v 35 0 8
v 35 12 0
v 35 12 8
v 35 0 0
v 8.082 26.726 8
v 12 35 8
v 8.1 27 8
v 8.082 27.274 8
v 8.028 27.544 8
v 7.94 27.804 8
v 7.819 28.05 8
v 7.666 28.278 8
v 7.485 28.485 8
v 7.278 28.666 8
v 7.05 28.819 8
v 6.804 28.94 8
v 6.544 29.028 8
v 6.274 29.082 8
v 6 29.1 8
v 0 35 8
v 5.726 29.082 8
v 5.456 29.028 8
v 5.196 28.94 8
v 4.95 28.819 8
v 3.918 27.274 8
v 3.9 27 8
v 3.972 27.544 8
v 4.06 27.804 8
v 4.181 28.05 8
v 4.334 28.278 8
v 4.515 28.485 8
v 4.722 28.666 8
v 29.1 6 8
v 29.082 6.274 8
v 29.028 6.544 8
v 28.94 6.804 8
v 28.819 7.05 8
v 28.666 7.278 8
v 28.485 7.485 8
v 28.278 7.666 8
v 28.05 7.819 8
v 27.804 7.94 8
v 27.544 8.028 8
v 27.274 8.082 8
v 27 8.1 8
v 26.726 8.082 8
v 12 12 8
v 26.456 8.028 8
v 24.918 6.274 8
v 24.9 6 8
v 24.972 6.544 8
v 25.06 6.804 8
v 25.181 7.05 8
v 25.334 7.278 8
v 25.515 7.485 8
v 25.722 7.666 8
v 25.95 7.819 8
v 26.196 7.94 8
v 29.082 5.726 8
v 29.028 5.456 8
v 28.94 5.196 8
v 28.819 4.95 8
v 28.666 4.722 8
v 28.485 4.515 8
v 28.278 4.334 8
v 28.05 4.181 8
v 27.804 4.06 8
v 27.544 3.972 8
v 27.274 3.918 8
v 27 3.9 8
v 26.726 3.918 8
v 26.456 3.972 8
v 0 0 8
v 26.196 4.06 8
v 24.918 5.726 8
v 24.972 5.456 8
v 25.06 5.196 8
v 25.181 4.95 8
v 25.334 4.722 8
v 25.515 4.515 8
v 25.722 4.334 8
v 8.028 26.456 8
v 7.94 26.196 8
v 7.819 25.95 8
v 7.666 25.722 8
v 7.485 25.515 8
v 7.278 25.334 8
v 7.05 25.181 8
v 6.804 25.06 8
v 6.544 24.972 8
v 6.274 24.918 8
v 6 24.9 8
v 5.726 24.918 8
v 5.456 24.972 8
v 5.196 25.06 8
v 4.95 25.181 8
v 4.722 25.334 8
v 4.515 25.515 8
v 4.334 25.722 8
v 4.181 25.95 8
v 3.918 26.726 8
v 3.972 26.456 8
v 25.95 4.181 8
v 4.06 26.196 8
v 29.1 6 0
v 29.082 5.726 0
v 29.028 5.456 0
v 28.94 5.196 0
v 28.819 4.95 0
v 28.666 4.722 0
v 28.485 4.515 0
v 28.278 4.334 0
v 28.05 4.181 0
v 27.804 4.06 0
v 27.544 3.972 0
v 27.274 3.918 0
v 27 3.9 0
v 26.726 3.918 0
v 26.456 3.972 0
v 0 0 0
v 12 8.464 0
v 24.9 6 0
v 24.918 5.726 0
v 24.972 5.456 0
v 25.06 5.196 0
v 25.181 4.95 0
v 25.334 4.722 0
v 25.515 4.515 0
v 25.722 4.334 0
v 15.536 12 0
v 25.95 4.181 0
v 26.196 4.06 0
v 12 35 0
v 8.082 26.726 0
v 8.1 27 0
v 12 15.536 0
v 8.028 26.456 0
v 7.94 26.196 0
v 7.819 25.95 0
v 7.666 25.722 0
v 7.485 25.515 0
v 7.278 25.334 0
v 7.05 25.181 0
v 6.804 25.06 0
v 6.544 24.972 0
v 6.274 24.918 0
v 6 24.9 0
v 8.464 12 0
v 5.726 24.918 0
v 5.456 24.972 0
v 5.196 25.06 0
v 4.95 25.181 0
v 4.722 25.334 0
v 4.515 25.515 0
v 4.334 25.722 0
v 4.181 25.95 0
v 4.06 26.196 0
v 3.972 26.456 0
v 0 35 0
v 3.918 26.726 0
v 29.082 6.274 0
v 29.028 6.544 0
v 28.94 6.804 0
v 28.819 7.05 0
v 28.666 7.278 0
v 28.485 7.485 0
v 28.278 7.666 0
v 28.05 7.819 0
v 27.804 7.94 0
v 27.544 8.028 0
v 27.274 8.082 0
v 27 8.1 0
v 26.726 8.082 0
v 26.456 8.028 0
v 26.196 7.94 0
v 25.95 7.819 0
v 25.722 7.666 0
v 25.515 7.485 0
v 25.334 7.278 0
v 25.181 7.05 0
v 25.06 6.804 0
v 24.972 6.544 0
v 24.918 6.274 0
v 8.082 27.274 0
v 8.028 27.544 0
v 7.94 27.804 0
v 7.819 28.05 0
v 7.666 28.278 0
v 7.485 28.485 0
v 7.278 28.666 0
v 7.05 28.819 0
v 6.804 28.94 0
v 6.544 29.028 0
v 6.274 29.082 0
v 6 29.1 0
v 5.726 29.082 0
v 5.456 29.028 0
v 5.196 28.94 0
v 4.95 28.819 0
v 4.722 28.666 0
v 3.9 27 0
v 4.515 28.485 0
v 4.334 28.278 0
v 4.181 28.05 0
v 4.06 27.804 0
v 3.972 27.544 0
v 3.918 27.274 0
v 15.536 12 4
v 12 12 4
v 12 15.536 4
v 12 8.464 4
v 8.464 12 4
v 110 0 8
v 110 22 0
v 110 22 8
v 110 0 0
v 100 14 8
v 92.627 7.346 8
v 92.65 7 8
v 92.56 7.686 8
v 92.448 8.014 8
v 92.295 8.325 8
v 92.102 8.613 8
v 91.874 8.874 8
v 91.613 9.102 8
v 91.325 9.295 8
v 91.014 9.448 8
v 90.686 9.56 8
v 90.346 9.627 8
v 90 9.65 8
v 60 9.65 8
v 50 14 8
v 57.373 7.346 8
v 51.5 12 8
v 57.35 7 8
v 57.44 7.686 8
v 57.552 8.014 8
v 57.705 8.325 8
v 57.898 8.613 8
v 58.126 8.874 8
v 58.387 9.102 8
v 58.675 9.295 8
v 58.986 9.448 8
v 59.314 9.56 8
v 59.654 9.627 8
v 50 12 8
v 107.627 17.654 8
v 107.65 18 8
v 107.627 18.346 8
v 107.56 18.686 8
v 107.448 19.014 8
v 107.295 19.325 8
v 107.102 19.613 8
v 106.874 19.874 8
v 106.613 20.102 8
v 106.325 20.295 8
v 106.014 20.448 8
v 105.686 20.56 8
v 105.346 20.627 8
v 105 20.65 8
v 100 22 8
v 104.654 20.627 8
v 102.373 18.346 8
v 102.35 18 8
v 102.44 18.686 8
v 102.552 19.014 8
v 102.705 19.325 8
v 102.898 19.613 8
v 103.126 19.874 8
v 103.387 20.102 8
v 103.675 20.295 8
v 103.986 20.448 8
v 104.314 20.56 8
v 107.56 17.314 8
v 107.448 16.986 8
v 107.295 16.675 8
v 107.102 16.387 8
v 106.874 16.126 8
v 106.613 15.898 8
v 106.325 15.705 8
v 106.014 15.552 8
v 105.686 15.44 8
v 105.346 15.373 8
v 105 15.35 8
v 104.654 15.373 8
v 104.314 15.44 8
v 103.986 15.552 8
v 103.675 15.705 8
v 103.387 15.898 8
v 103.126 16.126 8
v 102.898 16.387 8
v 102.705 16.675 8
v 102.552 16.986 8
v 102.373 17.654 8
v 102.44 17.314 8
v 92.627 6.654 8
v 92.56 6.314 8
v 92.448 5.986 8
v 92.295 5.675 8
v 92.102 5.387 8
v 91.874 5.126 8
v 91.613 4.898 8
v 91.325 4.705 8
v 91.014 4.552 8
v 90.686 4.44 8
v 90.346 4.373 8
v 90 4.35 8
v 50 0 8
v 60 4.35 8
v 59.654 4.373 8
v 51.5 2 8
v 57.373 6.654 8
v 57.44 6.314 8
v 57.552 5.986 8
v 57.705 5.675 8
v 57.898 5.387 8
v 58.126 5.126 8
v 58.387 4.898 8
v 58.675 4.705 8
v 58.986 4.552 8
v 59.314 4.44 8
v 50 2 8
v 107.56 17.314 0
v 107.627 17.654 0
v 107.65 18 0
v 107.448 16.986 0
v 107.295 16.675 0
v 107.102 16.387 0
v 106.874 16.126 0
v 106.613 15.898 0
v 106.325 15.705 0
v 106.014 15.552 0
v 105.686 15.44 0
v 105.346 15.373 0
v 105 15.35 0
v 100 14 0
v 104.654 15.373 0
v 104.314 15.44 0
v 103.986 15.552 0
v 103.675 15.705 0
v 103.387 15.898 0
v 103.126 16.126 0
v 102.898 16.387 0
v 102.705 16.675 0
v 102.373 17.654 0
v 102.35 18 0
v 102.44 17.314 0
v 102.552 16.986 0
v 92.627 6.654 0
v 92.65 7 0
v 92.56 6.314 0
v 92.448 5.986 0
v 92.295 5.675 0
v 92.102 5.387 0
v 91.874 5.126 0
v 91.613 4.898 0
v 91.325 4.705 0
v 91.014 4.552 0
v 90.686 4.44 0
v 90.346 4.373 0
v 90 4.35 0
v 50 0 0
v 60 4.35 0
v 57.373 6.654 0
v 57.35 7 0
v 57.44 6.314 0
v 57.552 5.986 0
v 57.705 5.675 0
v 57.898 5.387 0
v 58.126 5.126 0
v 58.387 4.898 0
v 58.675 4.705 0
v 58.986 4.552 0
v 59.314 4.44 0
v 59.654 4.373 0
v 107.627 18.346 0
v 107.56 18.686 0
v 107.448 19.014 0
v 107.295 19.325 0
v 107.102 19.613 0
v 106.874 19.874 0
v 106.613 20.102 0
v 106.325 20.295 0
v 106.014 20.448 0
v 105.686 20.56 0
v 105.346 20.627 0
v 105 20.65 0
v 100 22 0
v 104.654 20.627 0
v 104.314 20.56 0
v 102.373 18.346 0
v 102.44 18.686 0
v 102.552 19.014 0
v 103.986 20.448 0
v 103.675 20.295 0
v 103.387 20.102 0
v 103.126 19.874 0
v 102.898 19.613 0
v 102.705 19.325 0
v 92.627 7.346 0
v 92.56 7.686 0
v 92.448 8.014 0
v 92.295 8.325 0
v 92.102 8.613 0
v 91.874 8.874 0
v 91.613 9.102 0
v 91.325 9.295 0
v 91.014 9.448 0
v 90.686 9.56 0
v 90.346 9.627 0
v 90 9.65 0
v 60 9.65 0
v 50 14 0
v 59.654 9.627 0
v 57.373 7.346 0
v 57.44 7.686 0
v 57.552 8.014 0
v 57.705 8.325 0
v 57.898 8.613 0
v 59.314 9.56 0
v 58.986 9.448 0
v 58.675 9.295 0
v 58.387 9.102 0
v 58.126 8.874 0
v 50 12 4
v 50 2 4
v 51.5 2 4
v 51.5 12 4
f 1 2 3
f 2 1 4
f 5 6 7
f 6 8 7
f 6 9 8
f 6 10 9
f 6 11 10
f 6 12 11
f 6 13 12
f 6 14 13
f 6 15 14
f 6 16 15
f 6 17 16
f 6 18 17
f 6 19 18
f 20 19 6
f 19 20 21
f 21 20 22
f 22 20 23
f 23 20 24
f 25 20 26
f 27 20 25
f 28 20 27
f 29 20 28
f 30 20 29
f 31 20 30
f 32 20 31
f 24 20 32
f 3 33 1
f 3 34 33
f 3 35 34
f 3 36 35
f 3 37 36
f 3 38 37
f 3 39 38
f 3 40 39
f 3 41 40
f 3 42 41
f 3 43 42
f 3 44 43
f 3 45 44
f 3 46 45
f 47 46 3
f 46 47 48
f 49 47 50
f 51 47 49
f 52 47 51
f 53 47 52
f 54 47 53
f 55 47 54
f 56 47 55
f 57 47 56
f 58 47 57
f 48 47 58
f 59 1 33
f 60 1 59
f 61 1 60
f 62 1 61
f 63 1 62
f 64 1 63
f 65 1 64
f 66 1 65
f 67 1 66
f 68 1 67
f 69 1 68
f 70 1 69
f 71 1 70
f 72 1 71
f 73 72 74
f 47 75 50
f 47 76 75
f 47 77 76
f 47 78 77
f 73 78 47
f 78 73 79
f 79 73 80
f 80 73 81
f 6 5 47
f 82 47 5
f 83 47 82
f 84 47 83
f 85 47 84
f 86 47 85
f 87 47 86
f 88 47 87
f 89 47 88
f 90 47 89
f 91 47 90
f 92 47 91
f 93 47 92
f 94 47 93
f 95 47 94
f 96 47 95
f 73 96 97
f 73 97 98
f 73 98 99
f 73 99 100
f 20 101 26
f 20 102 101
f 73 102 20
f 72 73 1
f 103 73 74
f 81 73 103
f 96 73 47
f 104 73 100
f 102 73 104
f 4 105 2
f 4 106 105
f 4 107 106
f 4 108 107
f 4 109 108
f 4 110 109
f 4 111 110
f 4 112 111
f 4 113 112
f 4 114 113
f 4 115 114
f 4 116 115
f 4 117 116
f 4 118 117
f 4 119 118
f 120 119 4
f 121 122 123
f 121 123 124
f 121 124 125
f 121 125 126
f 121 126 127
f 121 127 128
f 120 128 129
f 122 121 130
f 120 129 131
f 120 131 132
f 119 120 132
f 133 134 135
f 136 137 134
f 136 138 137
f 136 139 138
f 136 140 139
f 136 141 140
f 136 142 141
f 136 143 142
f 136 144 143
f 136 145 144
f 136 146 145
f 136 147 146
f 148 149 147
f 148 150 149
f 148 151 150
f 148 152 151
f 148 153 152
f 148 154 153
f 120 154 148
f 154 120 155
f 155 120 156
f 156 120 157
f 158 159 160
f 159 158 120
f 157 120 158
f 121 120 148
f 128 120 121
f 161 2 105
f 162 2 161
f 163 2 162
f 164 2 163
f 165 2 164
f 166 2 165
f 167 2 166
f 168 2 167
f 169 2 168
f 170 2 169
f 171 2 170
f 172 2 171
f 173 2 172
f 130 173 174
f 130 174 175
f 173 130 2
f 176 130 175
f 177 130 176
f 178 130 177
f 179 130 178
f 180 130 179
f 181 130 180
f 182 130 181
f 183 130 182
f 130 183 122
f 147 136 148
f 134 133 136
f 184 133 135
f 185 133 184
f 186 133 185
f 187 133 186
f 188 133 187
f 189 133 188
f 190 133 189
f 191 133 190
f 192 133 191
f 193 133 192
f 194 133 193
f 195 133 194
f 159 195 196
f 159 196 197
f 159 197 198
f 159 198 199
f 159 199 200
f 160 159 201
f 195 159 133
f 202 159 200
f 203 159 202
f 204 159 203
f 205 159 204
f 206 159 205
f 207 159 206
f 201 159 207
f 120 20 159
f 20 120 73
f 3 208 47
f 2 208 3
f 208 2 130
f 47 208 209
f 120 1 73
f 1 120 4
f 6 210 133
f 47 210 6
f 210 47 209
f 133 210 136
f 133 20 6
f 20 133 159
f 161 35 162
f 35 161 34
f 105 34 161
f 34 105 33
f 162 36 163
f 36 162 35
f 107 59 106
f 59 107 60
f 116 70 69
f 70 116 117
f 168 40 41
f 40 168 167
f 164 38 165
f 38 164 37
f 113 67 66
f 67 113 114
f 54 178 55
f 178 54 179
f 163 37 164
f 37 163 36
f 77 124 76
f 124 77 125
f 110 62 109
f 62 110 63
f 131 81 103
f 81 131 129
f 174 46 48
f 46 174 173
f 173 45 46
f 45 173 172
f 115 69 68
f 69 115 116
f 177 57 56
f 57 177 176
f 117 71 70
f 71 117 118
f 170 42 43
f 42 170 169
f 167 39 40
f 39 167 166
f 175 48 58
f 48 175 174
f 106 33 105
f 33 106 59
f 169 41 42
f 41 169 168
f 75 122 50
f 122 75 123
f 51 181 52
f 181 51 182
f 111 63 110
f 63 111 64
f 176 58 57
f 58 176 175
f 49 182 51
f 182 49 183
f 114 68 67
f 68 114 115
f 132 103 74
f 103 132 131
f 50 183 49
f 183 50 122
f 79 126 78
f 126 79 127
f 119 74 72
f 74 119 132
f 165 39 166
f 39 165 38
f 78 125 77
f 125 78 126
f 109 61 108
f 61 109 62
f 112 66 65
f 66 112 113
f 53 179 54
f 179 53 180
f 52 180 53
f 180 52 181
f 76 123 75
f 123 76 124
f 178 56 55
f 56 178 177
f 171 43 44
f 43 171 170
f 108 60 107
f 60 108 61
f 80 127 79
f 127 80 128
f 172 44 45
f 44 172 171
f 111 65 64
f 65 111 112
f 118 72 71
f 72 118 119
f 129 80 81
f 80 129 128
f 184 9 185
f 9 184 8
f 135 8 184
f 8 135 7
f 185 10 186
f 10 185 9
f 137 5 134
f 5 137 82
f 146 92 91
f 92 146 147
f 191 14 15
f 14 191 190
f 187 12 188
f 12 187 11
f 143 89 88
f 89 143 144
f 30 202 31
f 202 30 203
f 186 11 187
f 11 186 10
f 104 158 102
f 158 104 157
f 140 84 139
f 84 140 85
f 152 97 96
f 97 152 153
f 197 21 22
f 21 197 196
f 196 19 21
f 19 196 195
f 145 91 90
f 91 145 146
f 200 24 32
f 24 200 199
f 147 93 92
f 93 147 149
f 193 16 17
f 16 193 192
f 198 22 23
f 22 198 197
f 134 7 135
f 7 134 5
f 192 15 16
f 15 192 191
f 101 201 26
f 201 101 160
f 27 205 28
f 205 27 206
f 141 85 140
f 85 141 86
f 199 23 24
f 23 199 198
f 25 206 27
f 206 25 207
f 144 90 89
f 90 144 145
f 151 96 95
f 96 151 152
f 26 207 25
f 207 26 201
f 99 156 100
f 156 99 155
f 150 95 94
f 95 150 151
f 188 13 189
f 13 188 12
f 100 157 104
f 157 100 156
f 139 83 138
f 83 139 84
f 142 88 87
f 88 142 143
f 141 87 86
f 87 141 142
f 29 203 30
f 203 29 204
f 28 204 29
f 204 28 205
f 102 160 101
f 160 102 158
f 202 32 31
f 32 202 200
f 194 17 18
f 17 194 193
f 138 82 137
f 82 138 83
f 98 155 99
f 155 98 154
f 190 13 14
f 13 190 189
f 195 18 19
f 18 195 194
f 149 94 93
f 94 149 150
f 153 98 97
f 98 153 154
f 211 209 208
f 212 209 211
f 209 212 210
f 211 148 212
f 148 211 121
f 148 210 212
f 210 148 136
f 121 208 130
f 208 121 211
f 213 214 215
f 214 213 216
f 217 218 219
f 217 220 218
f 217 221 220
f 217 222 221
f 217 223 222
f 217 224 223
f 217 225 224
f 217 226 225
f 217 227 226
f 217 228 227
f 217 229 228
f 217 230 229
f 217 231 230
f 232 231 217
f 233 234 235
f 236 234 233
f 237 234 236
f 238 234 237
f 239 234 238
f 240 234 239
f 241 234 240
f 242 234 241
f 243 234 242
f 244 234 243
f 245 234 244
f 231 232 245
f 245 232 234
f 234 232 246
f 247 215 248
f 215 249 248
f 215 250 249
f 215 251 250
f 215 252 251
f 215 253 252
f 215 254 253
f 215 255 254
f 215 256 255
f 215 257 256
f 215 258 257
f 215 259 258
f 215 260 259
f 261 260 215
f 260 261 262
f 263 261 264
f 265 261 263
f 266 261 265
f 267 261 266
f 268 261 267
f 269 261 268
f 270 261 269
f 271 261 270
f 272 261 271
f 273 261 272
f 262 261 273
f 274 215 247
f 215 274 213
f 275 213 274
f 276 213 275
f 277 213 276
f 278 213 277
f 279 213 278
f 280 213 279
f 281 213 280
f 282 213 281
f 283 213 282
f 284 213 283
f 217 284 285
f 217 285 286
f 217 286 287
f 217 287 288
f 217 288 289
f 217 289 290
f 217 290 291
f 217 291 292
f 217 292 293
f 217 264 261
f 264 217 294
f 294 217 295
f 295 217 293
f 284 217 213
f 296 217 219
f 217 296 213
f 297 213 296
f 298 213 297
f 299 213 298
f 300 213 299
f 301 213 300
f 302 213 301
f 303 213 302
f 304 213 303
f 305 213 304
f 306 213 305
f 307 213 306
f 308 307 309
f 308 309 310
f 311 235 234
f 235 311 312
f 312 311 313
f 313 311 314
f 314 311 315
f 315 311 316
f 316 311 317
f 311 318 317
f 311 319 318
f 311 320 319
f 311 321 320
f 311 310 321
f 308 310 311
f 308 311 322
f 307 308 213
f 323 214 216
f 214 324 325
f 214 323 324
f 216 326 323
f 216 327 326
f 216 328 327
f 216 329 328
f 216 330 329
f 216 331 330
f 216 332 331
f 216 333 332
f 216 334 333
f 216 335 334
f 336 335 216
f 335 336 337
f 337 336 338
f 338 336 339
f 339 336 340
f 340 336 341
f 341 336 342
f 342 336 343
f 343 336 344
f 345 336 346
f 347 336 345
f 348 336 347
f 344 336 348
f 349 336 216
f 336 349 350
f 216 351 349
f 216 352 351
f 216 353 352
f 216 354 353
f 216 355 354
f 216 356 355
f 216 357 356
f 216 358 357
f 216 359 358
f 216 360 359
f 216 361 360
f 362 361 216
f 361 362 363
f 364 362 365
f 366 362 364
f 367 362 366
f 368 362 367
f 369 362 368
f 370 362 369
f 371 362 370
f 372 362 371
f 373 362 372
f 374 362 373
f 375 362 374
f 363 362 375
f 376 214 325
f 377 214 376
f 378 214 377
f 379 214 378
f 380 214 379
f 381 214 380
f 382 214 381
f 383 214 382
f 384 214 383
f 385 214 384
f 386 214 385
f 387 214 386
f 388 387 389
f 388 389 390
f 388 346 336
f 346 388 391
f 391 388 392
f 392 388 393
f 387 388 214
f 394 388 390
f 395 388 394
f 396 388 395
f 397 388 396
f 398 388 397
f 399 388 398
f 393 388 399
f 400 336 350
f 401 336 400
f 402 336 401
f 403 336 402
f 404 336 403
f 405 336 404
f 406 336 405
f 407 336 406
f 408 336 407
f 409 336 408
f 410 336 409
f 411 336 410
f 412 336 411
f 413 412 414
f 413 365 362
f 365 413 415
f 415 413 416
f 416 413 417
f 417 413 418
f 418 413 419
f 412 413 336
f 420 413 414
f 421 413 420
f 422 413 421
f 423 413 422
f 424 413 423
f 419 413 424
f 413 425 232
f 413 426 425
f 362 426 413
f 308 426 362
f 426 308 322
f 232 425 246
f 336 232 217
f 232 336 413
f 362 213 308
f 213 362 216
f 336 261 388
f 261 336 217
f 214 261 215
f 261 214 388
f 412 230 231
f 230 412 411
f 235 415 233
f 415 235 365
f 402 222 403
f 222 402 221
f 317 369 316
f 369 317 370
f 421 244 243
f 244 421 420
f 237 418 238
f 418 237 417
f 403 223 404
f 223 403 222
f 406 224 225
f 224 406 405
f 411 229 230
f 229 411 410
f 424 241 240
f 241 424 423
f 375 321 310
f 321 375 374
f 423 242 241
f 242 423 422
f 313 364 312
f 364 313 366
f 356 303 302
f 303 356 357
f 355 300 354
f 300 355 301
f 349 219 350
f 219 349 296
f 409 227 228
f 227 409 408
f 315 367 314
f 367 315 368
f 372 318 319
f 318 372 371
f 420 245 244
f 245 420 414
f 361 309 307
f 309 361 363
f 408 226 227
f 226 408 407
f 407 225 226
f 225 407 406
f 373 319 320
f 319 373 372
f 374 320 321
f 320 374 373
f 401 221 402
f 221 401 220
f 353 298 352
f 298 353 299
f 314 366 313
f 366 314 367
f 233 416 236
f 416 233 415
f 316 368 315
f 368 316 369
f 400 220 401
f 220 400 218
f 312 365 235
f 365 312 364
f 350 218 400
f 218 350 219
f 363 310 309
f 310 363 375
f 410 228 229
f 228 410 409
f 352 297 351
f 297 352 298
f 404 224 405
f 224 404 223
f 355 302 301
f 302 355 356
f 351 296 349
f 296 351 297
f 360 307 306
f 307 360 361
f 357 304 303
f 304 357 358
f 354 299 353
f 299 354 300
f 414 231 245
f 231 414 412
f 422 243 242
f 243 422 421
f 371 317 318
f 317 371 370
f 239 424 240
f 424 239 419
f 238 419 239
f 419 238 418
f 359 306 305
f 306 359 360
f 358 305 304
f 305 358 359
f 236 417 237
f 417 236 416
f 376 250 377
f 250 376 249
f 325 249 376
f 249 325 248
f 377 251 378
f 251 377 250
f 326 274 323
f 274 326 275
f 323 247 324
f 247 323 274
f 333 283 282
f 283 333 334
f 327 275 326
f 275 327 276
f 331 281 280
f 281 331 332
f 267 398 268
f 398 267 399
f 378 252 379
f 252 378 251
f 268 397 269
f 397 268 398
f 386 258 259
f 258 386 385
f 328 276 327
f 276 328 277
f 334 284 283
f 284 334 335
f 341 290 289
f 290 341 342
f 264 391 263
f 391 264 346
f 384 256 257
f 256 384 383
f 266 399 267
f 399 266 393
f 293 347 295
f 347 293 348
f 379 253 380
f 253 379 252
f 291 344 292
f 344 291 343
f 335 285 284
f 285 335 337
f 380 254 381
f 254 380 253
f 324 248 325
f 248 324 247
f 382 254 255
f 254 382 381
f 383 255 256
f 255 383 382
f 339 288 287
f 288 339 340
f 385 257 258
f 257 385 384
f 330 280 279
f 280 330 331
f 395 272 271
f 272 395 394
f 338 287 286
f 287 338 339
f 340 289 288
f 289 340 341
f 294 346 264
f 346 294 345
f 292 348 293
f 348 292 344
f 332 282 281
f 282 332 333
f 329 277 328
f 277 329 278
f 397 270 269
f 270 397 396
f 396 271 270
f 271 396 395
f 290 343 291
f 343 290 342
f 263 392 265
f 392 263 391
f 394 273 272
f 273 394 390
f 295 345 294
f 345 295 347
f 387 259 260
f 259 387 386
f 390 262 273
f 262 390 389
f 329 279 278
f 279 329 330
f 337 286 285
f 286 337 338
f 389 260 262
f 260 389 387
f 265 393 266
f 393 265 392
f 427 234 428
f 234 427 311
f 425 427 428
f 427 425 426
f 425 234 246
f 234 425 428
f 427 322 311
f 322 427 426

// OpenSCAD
// file: 00_config.scad
// 00_config.scad — shared dimensions for the AndroidTester machine, in mm.
//
// These constants are the single source for every part in cad/openscad/.
// They are cross-checked by tests/test_design_package.py against
// androidtester/config.py (deck size, clearance planes) and
// firmware/klipper/androidtester.cfg (position_max) — change them together.

// -- deck and travels -------------------------------------------------------
// Deck == reachable XY (cfg position_max == config.py deck defaults).
DECK_W   = 400;          // deck X, config.py deck_width_mm, stepper_x position_max
DECK_D   = 300;          // deck Y, config.py deck_height_mm, stepper_y position_max
X_TRAVEL = 400;          // == DECK_W
Y_TRAVEL = 300;          // == DECK_D
Z_TRAVEL = 60;           // tool-Z elevator travel (manual_stepper tool_z)
TRAVEL_Z = 40;           // clearance plane, config.py travel_z_mm
TOUCH_Z  = 5;            // finger-tip contact plane, config.py touch_z_mm

// -- linear rails -------------------------------------------------------------
// X rail: must span the full X travel plus the carriage plus end margins:
//   X_TRAVEL (400) + X_CARRIAGE_LEN (45) + 2*END_MARGIN (10) = 465 mm min
//   -> RAIL_X_LEN = 500 (next stock MGN12 length, 35 mm of setup slack).
// Y rails (x2, carry the gantry beam):
//   Y_TRAVEL (300) + X_CARRIAGE_LEN (45) + 2*END_MARGIN (10) = 365 mm min
//   -> RAIL_Y_LEN = 400.
// Z rail (tool elevator, MGN9):
//   Z_TRAVEL (60) + Z_CARRIAGE_LEN (40) + 2*END_MARGIN (10) = 120 mm min
//   -> RAIL_Z_LEN = 150.
RAIL_X_LEN = 500;
RAIL_Y_LEN = 400;
RAIL_Z_LEN = 150;
X_CARRIAGE_LEN = 45;     // MGN12H block, 27 x 45.4 mm (nominal — verify rail vendor)
Z_CARRIAGE_LEN = 40;     // MGN9H block, 20 x 38.9 mm (nominal — verify rail vendor)
END_MARGIN   = 10;       // endstop trigger + belt/idler clearance at each rail end
RAIL12_W = 12;           // MGN12 rail width / height
RAIL12_H = 8;
RAIL9_W  = 9;            // MGN9 rail width / height
RAIL9_H  = 6.5;

// -- frame --------------------------------------------------------------------
EXT = 20;                // 2020 aluminium extrusion (6 mm slot)
FRAME_W = DECK_W + 100;  // 500 — gantry beam carries the full X rail (500)
FRAME_D = DECK_D + 100;  // 400 — side beams carry the full Y rails (400)
POST_H  = 200;           // gantry posts above the base frame
CAM_POST_H = 400;        // overhead camera post above the deck

// -- motors / motion hardware ---------------------------------------------------
NEMA_W   = 42.3;         // NEMA17 face
NEMA_HOLE_SP = 31;       // NEMA17 M3 hole spacing
NEMA_BORE  = 22.2;       // NEMA17 pilot bore (clearance)
PULLEY_D = 12.2;         // GT2 20T pulley OD (2 mm pitch x 20 T = 40 mm/rev)
IDLER_D  = 12.2;         // GT2 20T idler OD, 5 mm bore
BELT_W   = 6;            // GT2 belt width
LEAD_D   = 8;            // T8 lead screw (2 mm pitch x 4 starts = 8 mm/rev)

// -- servos (SG90 / MG90S class) -------------------------------------------------
SERVO_W   = 23;          // body across tabs axis
SERVO_D   = 12.5;        // body depth
SERVO_H   = 23;          // body height below the mounting tabs
SERVO_TAB_W = 32.5;      // across the mounting tabs
SERVO_SHAFT_D = 5;       // output shaft / horn boss clearance
SERVO_SHAFT_OFF = 6;     // shaft centre from body end wall

// -- finger tool -----------------------------------------------------------------
FINGER_TIP_D  = 8;       // conductive tip diameter
FINGER_SHAFT_D = 6;      // plunger shaft
SPRING_D  = 8.5;         // compression-spring pocket (Ø8 spring, k ≈ 0.5 N/mm)
FINGER_STROKE = 15;      // spring working stroke (3–12 mm compression -> 1.5–6 N)

// -- fasteners ---------------------------------------------------------------------
M3_CLEAR = 3.2;
M4_CLEAR = 4.2;
M5_CLEAR = 5.3;
M3_HEAD  = 6.0;          // M3 button-head clearance

// -- device nest ---------------------------------------------------------------------
DEVICE_MAX_W = 280;      // phones through ~11" tablets (250 x 170 + case)
DEVICE_MAX_D = 200;
NEST_STOP_H  = 8;        // stop height: below screen, clear of ArUco markers
NEST_CLEAR   = 40;       // keep-out at each deck corner (ArUco marker zone)

$fn = 48;
// main file
// device_nest.scad — adjustable fixture holding the device under test.
// Phones through ~11" tablets (up to DEVICE_MAX_W x DEVICE_MAX_D). Two fixed
// corner stops reference the device; two sliding clamps close against the
// other edges. Everything is NEST_STOP_H (8 mm) tall or shorter — below the
// screen, out of the overhead camera's view of the glass, and clear of the
// NEST_CLEAR (40 mm) ArUco marker zones at the deck corners.
//
// Parts (PART selector):
//   corner_stop — fixed L reference stop, M4 bolts to the deck plate
//   side_clamp  — sliding clamp: 30 mm slot + M5 thumb-screw tab
//
// Export: openscad -o corner_stop.stl -D 'PART="corner_stop"' device_nest.scad
include <00_config.scad>

PART = is_undef(_AT_PART) ? "preview" : _AT_PART;  // -D 'PART=...' or a render wrapper overrides

module corner_stop() {
    arm = 35;
    t = NEST_STOP_H;
    w = 12;              // arm width
    difference() {
        union() {
            cube([arm, w, t]);
            cube([w, arm, t]);
        }
        // M4 bolt holes at the arm ends (deck plate M4 grid)
        translate([arm - 8, w / 2, -0.1]) cylinder(d = M4_CLEAR, h = t + 0.2);
        translate([w / 2, arm - 8, -0.1]) cylinder(d = M4_CLEAR, h = t + 0.2);
        // 45° relief at the inner vertex (w,w) so the device's rounded
        // corner / case lip doesn't ride on the reference corner
        translate([w, w, -0.1]) rotate([0, 0, 45])
            cube([5, 5, t + 0.2], center = true);
    }
}

module side_clamp() {
    l = 60;
    w = 14;
    t = NEST_STOP_H;
    slot_l = 30;
    difference() {
        union() {
            cube([l, w, t]);
            // thumb-screw tab standing off the back
            translate([l - 10, w, 0]) cube([10, 8, t]);
        }
        // M5 clamp slot (bolt + T-nut into the deck plate)
        hull()
            for (x = [10, 10 + slot_l])
                translate([x, w / 2, -0.1]) cylinder(d = M5_CLEAR, h = t + 0.2);
        // M5 clearance in the thumb tab
        translate([l - 5, w + 4, -0.1]) cylinder(d = M5_CLEAR, h = t + 0.2);
        // rubber-pad recess on the device contact face (10 x 10 x 1.5)
        translate([-0.1, w / 2 - 5, t - 4]) cube([1.5 + 0.1, 10, 4]);
    }
}

// -- preview / selector ---------------------------------------------------------
if (PART == "preview" || PART == "corner_stop")
    corner_stop();
if (PART == "preview")
    translate([50, 0, 0]) side_clamp();
else if (PART == "side_clamp")
    side_clamp();
